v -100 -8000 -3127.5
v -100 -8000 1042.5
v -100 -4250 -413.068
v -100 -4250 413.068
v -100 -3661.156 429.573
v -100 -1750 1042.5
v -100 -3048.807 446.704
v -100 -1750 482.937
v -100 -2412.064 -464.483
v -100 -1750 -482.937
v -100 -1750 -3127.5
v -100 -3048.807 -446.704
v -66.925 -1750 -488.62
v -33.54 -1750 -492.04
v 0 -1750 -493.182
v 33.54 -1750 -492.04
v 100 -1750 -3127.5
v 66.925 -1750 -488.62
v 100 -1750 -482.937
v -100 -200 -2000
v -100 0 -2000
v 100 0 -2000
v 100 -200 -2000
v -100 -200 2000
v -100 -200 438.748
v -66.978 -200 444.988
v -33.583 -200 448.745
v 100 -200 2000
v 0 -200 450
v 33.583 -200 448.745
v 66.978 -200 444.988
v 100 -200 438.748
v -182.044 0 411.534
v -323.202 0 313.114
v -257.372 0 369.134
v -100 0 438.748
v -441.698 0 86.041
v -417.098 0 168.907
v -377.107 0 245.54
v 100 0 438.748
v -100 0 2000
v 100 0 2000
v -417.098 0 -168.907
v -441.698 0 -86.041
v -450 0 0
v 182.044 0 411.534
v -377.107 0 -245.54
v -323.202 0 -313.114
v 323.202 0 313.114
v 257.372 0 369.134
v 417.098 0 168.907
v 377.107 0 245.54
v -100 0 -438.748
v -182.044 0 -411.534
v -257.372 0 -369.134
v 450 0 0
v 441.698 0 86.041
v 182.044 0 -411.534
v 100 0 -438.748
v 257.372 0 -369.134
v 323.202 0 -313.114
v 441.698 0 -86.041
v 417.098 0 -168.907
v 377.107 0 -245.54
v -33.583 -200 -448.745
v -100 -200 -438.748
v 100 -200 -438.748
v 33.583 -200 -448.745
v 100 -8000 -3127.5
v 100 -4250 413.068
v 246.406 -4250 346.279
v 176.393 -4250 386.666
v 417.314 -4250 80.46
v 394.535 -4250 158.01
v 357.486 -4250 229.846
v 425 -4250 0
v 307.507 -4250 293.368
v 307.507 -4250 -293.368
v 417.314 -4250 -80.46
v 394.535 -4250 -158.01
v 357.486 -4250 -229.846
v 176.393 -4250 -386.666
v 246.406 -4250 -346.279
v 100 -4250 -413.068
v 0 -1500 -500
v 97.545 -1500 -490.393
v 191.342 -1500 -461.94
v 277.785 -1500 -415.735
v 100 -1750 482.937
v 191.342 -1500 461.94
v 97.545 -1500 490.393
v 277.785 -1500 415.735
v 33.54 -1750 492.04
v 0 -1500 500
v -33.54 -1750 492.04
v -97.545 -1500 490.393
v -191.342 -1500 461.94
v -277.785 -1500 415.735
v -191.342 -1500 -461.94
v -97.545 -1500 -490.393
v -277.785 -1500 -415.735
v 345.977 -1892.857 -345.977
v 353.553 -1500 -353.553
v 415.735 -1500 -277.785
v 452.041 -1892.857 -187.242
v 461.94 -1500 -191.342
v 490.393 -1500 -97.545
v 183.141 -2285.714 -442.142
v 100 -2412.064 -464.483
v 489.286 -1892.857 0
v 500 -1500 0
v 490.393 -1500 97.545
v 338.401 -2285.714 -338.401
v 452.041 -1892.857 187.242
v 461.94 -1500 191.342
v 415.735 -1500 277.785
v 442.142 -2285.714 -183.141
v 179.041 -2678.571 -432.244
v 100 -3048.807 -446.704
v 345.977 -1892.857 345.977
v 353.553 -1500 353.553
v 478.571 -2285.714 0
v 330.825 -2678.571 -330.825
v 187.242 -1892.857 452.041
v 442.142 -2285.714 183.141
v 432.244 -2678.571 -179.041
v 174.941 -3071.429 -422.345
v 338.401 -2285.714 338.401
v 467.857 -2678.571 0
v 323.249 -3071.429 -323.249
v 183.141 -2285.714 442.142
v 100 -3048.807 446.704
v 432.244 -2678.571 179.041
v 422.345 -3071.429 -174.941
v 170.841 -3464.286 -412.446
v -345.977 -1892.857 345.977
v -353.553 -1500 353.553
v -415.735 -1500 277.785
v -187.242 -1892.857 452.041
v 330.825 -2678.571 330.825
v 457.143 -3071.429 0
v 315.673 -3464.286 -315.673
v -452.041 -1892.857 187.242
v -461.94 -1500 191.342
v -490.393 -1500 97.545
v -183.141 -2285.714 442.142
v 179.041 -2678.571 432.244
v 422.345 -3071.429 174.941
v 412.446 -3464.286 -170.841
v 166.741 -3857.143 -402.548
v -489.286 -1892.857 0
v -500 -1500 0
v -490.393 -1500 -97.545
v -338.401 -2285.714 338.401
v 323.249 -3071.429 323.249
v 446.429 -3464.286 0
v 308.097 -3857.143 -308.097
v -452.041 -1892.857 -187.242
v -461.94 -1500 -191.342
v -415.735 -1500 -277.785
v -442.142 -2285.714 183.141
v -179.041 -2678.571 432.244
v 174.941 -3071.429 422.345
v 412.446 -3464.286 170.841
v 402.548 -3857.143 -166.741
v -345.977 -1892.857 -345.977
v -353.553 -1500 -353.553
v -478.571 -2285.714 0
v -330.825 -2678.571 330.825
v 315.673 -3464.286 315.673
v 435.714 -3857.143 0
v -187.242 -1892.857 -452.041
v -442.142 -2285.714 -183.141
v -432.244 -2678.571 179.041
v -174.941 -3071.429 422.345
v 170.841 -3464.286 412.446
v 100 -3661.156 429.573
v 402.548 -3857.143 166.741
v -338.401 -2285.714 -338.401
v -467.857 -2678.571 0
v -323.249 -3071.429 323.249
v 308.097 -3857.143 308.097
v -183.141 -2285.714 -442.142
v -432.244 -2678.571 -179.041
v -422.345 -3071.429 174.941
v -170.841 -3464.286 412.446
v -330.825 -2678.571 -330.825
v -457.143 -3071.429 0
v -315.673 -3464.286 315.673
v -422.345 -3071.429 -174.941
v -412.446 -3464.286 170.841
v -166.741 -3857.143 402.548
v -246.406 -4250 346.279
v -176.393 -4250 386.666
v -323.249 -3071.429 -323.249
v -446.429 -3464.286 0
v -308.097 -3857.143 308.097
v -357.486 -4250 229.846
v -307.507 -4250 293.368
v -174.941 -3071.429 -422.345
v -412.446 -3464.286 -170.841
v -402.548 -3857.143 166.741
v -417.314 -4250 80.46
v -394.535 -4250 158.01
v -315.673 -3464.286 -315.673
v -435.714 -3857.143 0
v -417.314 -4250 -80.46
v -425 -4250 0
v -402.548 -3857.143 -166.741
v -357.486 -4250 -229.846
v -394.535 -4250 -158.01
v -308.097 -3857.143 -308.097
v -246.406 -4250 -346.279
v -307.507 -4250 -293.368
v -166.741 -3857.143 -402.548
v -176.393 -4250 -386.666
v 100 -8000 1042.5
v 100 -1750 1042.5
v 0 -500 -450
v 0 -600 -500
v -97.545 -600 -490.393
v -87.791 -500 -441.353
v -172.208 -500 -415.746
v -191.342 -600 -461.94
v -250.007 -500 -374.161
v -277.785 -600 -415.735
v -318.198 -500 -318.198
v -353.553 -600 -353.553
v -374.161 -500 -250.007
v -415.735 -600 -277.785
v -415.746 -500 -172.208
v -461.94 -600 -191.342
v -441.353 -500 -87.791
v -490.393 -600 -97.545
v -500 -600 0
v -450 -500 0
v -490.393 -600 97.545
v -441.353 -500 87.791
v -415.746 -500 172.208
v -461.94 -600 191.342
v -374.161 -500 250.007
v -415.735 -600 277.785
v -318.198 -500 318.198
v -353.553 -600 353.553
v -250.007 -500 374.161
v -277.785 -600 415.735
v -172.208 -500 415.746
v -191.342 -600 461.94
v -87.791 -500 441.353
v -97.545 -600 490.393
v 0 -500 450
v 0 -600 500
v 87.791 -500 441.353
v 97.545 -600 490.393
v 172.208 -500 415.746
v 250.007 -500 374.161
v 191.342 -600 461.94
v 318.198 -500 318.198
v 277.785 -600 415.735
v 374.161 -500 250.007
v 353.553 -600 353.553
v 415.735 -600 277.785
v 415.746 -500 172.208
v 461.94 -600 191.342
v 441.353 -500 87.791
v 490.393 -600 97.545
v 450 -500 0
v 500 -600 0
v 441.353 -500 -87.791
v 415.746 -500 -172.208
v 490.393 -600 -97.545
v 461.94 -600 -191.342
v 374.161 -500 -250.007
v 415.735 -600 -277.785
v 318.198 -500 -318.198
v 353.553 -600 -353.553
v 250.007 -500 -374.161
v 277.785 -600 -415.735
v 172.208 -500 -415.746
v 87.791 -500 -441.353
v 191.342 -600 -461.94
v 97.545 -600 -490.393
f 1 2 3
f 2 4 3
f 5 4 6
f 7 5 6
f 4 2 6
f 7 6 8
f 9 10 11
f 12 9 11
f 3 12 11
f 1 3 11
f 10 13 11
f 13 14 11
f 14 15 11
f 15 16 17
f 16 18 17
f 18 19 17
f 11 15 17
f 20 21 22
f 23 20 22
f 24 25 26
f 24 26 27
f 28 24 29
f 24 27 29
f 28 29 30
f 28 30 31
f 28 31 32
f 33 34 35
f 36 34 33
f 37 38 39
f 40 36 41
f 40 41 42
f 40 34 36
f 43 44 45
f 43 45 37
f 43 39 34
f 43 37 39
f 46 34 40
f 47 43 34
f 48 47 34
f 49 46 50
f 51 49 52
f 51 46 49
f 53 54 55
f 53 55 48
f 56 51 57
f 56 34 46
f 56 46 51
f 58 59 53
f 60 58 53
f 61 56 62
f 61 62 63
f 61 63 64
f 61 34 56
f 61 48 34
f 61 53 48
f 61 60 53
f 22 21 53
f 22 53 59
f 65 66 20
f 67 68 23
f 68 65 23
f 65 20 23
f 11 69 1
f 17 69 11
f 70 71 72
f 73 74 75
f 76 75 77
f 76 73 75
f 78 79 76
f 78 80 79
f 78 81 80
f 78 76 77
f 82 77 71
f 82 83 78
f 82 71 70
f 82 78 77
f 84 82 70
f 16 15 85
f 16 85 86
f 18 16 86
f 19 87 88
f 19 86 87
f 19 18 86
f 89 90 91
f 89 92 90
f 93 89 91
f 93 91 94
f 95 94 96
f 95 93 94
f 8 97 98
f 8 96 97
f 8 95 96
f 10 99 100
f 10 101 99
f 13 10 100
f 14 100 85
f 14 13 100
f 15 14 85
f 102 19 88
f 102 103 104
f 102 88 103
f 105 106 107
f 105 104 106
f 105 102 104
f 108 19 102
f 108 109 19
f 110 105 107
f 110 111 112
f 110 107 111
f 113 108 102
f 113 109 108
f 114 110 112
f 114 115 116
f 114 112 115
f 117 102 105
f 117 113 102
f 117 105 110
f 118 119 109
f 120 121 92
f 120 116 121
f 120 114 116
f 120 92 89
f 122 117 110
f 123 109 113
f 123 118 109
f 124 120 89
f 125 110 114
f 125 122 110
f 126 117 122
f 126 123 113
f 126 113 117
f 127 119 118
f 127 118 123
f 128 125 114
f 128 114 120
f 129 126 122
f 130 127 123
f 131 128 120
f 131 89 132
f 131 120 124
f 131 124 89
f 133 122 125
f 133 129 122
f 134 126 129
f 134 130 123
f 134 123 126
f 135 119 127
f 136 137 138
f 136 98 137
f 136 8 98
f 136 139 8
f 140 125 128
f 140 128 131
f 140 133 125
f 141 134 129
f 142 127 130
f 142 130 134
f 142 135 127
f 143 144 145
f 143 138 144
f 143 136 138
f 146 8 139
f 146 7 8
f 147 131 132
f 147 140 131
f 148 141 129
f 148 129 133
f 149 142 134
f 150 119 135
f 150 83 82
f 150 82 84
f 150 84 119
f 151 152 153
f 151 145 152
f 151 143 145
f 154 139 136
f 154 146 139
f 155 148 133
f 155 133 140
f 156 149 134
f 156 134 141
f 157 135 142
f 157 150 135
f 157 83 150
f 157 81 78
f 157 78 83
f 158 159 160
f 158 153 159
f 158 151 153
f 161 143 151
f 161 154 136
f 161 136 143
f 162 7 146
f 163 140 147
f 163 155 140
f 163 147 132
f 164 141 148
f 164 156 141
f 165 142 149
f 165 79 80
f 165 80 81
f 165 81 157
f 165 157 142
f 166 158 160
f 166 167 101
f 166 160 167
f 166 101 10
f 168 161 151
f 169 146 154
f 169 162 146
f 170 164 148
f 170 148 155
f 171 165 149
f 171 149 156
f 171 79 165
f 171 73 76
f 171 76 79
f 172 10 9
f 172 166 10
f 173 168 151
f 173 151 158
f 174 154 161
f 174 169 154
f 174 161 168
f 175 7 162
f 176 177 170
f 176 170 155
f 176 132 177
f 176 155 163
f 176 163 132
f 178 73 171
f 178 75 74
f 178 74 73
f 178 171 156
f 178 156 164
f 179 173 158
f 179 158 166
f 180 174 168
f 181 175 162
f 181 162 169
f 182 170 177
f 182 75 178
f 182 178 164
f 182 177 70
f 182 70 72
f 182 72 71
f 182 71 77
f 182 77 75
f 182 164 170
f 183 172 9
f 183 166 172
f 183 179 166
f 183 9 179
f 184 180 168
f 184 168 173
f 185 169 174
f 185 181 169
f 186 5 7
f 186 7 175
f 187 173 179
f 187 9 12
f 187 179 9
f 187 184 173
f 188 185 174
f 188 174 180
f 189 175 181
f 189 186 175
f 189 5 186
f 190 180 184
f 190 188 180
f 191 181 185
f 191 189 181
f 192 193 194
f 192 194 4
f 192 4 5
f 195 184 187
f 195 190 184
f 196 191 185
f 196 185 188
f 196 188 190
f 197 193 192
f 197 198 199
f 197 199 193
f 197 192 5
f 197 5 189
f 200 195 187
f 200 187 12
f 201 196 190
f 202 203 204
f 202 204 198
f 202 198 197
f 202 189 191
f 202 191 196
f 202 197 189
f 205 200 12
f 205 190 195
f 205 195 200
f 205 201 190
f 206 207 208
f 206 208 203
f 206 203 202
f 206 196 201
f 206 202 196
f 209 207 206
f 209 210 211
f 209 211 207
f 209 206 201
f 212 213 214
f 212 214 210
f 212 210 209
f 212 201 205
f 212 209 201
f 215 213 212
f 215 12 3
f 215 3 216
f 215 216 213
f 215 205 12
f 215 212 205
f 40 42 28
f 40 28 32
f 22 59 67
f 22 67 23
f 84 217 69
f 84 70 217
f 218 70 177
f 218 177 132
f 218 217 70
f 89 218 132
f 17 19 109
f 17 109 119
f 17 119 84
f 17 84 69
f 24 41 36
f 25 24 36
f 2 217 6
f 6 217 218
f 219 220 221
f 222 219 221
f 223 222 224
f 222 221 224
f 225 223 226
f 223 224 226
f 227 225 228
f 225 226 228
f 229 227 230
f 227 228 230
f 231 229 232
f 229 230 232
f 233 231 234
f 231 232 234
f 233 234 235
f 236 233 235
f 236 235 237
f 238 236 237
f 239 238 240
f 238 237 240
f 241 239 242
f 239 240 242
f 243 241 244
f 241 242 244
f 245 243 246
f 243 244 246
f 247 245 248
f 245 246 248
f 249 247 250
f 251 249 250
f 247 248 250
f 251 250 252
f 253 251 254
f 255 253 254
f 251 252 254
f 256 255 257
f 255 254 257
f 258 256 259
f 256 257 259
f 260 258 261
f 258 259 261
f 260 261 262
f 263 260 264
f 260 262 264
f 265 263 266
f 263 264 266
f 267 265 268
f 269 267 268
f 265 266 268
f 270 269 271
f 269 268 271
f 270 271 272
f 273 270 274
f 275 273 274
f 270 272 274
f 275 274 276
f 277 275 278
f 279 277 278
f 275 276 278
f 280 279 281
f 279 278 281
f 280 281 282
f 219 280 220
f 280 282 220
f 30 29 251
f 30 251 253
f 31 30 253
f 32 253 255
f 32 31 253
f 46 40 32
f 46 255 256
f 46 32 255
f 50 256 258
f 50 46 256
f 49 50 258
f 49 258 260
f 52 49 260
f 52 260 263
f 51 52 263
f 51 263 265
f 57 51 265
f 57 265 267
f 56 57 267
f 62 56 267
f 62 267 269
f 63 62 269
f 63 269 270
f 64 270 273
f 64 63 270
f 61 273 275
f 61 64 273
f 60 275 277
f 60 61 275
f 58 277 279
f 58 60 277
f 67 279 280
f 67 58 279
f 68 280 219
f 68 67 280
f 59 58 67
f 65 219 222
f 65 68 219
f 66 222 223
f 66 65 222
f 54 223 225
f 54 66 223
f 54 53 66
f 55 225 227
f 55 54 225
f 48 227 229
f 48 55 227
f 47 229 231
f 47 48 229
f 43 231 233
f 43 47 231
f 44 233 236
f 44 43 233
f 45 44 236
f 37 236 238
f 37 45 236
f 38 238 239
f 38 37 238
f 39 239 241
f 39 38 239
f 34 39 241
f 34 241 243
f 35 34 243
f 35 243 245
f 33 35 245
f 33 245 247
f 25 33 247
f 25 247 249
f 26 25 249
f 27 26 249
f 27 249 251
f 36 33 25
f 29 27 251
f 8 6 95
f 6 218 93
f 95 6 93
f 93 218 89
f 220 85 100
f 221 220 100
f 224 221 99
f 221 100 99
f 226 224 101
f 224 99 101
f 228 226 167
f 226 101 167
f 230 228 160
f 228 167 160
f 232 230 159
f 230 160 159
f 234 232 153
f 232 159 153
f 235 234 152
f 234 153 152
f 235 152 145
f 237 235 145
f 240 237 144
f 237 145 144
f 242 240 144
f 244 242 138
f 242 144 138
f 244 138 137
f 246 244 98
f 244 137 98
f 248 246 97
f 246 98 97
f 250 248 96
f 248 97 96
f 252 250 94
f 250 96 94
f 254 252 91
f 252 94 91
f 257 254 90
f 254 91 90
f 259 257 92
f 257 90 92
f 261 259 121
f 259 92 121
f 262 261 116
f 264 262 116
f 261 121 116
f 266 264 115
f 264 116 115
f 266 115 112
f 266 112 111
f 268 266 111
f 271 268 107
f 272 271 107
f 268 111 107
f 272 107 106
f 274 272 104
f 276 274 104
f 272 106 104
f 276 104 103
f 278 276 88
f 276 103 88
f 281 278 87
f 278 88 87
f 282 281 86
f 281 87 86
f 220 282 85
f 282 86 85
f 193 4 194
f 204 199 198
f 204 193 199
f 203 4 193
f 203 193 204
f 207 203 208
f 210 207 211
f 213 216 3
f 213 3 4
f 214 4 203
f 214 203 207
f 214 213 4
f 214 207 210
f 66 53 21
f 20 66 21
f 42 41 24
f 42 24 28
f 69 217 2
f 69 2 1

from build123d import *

# Parameters (mm, degrees)
SKETCH_8_R       = 450
EXTRUDE_3_DEPTH  = 500
SKETCH_20_R      = 425
SKETCH_22_W      = 4170
SKETCH_22_H      = 6250
EXTRUDE_9_DEPTH  = 100
SKETCH_25_W      = 200
SKETCH_25_H      = 4000
EXTRUDE_12_DEPTH = 200


with BuildPart() as part:
    # 草图8 → 凸台-拉伸3 (new body)
    with BuildSketch(Plane(origin=(0, 0, 0), x_dir=(1, 0, 0), z_dir=(0, 1, 0))):
        with Locations(Location((0, 0, 0), (0, 0, 270))):
            Circle(SKETCH_8_R)
    extrude(amount=-EXTRUDE_3_DEPTH)

    # 草图19 → 旋转1 (revolve)
    with BuildSketch(Plane(origin=(0, 0, 0), x_dir=(0, 0, -1), z_dir=(1, 0, 0))):
        Polygon((450, -500), (500, -600), (500, -1500), (0, -1500), (0, -500), align=None)
    revolve(axis=Axis((0, -1500, 0), (0, 1, 0)))

    # 草图20 → section 1 of loft_2
    with BuildSketch(Plane(origin=(0, -4250, 0), x_dir=(-1, 0, 0), z_dir=(0, -1, 0)), mode=Mode.PRIVATE) as loft_2_s1:
        Circle(SKETCH_20_R)
    # loft up to a face of the part (loft_2)
    loft([Face(Wire([part.edges().sort_by_distance((364.484313711, -1500, 342.273552964))[0]])), loft_2_s1.sketch])

    # 草图22 → 凸台-拉伸9 (add, symmetric)
    with BuildSketch(Plane(origin=(0, 0, 0), x_dir=(0, 0, -1), z_dir=(1, 0, 0))):
        with Locations((1042.5, -4875)):
            Rectangle(SKETCH_22_W, SKETCH_22_H)
    extrude(amount=EXTRUDE_9_DEPTH, both=True)

    # 草图25 → 凸台-拉伸12 (add)
    with BuildSketch(Plane(origin=(0, 0, 0), x_dir=(1, 0, 0), z_dir=(0, 1, 0))):
        Rectangle(SKETCH_25_W, SKETCH_25_H)
    extrude(amount=-EXTRUDE_12_DEPTH)


solid = part.part
